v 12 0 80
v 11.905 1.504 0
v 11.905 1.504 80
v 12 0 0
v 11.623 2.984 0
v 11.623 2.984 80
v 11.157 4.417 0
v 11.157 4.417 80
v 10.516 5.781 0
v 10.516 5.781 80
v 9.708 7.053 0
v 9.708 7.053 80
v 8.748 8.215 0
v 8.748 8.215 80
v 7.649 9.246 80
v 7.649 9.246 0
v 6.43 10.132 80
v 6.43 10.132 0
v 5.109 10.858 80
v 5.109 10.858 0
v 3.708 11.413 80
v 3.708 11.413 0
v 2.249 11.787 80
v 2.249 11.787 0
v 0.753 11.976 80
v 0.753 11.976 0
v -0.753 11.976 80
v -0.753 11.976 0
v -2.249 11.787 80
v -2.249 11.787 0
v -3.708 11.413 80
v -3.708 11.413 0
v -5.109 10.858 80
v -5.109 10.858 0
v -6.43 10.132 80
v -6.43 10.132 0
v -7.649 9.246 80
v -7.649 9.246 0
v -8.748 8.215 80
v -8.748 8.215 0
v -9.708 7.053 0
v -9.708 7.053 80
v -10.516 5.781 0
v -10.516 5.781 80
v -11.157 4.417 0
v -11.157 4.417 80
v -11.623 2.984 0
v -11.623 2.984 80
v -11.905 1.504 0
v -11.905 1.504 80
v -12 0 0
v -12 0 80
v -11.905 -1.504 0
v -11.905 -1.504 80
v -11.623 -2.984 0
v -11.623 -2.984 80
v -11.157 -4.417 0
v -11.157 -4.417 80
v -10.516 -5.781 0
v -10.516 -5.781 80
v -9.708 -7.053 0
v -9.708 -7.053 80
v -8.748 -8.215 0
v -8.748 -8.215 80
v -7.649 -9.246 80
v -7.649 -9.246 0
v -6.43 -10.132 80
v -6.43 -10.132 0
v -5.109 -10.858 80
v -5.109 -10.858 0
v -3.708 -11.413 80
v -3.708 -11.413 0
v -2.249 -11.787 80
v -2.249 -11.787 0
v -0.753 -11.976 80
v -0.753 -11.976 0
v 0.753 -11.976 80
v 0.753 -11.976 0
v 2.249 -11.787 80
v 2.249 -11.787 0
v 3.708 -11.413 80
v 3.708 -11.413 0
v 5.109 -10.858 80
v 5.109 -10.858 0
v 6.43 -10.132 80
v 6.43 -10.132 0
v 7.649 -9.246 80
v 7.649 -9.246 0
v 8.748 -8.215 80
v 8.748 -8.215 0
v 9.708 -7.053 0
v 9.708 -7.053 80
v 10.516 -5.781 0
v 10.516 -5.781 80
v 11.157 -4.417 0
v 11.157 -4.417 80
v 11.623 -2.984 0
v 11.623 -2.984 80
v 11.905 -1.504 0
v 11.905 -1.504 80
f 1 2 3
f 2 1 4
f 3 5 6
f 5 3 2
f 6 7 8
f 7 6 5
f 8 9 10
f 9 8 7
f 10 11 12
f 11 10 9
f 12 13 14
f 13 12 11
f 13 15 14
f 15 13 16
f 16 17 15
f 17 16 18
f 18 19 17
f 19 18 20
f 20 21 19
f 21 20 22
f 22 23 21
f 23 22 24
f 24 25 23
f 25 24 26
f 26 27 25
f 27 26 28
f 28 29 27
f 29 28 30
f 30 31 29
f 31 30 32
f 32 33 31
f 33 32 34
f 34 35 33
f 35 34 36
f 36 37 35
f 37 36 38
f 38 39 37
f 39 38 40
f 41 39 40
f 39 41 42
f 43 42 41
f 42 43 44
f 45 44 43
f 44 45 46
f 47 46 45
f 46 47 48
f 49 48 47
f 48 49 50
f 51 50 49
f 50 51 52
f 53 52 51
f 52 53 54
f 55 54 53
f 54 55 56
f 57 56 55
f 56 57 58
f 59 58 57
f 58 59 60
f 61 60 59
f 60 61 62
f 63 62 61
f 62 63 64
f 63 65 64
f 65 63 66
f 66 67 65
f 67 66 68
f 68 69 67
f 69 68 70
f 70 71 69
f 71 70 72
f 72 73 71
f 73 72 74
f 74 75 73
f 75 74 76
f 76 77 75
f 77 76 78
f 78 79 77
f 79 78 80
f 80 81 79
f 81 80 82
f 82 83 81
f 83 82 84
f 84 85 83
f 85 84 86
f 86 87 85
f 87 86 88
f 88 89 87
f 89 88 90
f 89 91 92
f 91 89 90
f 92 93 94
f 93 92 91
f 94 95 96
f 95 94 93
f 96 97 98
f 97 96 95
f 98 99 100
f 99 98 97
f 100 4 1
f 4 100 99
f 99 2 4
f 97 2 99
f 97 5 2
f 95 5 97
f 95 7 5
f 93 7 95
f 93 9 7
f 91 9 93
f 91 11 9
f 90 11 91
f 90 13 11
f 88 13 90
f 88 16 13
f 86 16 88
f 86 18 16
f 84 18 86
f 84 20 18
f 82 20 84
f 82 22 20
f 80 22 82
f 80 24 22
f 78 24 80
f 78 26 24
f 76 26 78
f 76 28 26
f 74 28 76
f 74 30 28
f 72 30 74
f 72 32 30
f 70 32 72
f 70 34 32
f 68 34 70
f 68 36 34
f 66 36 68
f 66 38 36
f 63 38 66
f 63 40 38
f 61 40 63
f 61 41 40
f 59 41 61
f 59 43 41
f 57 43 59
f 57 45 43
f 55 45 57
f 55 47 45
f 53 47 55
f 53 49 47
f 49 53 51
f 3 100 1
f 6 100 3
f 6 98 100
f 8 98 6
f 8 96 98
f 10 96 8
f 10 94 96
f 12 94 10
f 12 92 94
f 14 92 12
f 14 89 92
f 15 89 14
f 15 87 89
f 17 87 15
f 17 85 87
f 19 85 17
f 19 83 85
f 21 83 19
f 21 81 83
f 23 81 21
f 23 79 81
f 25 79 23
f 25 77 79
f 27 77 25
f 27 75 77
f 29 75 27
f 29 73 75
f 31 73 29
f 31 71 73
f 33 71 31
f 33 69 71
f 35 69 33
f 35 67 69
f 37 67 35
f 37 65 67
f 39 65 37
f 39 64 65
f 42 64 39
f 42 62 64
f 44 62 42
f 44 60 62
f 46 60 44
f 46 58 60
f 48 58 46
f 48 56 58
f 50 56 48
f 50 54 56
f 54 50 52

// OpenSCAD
objectDiameter = 24.0;
height = 80;

/* [OpenSCAD] [Quality] */
$fn = 50;

//Hollow bit down the center of the chimney. Negative space.
module CylinderDispenser_Dispenser_Virgin_Flue_Hole(objectDiameter, height) {
	cylinder(d=objectDiameter, h=height);
}

color("red", .5)
CylinderDispenser_Dispenser_Virgin_Flue_Hole(objectDiameter, height);
